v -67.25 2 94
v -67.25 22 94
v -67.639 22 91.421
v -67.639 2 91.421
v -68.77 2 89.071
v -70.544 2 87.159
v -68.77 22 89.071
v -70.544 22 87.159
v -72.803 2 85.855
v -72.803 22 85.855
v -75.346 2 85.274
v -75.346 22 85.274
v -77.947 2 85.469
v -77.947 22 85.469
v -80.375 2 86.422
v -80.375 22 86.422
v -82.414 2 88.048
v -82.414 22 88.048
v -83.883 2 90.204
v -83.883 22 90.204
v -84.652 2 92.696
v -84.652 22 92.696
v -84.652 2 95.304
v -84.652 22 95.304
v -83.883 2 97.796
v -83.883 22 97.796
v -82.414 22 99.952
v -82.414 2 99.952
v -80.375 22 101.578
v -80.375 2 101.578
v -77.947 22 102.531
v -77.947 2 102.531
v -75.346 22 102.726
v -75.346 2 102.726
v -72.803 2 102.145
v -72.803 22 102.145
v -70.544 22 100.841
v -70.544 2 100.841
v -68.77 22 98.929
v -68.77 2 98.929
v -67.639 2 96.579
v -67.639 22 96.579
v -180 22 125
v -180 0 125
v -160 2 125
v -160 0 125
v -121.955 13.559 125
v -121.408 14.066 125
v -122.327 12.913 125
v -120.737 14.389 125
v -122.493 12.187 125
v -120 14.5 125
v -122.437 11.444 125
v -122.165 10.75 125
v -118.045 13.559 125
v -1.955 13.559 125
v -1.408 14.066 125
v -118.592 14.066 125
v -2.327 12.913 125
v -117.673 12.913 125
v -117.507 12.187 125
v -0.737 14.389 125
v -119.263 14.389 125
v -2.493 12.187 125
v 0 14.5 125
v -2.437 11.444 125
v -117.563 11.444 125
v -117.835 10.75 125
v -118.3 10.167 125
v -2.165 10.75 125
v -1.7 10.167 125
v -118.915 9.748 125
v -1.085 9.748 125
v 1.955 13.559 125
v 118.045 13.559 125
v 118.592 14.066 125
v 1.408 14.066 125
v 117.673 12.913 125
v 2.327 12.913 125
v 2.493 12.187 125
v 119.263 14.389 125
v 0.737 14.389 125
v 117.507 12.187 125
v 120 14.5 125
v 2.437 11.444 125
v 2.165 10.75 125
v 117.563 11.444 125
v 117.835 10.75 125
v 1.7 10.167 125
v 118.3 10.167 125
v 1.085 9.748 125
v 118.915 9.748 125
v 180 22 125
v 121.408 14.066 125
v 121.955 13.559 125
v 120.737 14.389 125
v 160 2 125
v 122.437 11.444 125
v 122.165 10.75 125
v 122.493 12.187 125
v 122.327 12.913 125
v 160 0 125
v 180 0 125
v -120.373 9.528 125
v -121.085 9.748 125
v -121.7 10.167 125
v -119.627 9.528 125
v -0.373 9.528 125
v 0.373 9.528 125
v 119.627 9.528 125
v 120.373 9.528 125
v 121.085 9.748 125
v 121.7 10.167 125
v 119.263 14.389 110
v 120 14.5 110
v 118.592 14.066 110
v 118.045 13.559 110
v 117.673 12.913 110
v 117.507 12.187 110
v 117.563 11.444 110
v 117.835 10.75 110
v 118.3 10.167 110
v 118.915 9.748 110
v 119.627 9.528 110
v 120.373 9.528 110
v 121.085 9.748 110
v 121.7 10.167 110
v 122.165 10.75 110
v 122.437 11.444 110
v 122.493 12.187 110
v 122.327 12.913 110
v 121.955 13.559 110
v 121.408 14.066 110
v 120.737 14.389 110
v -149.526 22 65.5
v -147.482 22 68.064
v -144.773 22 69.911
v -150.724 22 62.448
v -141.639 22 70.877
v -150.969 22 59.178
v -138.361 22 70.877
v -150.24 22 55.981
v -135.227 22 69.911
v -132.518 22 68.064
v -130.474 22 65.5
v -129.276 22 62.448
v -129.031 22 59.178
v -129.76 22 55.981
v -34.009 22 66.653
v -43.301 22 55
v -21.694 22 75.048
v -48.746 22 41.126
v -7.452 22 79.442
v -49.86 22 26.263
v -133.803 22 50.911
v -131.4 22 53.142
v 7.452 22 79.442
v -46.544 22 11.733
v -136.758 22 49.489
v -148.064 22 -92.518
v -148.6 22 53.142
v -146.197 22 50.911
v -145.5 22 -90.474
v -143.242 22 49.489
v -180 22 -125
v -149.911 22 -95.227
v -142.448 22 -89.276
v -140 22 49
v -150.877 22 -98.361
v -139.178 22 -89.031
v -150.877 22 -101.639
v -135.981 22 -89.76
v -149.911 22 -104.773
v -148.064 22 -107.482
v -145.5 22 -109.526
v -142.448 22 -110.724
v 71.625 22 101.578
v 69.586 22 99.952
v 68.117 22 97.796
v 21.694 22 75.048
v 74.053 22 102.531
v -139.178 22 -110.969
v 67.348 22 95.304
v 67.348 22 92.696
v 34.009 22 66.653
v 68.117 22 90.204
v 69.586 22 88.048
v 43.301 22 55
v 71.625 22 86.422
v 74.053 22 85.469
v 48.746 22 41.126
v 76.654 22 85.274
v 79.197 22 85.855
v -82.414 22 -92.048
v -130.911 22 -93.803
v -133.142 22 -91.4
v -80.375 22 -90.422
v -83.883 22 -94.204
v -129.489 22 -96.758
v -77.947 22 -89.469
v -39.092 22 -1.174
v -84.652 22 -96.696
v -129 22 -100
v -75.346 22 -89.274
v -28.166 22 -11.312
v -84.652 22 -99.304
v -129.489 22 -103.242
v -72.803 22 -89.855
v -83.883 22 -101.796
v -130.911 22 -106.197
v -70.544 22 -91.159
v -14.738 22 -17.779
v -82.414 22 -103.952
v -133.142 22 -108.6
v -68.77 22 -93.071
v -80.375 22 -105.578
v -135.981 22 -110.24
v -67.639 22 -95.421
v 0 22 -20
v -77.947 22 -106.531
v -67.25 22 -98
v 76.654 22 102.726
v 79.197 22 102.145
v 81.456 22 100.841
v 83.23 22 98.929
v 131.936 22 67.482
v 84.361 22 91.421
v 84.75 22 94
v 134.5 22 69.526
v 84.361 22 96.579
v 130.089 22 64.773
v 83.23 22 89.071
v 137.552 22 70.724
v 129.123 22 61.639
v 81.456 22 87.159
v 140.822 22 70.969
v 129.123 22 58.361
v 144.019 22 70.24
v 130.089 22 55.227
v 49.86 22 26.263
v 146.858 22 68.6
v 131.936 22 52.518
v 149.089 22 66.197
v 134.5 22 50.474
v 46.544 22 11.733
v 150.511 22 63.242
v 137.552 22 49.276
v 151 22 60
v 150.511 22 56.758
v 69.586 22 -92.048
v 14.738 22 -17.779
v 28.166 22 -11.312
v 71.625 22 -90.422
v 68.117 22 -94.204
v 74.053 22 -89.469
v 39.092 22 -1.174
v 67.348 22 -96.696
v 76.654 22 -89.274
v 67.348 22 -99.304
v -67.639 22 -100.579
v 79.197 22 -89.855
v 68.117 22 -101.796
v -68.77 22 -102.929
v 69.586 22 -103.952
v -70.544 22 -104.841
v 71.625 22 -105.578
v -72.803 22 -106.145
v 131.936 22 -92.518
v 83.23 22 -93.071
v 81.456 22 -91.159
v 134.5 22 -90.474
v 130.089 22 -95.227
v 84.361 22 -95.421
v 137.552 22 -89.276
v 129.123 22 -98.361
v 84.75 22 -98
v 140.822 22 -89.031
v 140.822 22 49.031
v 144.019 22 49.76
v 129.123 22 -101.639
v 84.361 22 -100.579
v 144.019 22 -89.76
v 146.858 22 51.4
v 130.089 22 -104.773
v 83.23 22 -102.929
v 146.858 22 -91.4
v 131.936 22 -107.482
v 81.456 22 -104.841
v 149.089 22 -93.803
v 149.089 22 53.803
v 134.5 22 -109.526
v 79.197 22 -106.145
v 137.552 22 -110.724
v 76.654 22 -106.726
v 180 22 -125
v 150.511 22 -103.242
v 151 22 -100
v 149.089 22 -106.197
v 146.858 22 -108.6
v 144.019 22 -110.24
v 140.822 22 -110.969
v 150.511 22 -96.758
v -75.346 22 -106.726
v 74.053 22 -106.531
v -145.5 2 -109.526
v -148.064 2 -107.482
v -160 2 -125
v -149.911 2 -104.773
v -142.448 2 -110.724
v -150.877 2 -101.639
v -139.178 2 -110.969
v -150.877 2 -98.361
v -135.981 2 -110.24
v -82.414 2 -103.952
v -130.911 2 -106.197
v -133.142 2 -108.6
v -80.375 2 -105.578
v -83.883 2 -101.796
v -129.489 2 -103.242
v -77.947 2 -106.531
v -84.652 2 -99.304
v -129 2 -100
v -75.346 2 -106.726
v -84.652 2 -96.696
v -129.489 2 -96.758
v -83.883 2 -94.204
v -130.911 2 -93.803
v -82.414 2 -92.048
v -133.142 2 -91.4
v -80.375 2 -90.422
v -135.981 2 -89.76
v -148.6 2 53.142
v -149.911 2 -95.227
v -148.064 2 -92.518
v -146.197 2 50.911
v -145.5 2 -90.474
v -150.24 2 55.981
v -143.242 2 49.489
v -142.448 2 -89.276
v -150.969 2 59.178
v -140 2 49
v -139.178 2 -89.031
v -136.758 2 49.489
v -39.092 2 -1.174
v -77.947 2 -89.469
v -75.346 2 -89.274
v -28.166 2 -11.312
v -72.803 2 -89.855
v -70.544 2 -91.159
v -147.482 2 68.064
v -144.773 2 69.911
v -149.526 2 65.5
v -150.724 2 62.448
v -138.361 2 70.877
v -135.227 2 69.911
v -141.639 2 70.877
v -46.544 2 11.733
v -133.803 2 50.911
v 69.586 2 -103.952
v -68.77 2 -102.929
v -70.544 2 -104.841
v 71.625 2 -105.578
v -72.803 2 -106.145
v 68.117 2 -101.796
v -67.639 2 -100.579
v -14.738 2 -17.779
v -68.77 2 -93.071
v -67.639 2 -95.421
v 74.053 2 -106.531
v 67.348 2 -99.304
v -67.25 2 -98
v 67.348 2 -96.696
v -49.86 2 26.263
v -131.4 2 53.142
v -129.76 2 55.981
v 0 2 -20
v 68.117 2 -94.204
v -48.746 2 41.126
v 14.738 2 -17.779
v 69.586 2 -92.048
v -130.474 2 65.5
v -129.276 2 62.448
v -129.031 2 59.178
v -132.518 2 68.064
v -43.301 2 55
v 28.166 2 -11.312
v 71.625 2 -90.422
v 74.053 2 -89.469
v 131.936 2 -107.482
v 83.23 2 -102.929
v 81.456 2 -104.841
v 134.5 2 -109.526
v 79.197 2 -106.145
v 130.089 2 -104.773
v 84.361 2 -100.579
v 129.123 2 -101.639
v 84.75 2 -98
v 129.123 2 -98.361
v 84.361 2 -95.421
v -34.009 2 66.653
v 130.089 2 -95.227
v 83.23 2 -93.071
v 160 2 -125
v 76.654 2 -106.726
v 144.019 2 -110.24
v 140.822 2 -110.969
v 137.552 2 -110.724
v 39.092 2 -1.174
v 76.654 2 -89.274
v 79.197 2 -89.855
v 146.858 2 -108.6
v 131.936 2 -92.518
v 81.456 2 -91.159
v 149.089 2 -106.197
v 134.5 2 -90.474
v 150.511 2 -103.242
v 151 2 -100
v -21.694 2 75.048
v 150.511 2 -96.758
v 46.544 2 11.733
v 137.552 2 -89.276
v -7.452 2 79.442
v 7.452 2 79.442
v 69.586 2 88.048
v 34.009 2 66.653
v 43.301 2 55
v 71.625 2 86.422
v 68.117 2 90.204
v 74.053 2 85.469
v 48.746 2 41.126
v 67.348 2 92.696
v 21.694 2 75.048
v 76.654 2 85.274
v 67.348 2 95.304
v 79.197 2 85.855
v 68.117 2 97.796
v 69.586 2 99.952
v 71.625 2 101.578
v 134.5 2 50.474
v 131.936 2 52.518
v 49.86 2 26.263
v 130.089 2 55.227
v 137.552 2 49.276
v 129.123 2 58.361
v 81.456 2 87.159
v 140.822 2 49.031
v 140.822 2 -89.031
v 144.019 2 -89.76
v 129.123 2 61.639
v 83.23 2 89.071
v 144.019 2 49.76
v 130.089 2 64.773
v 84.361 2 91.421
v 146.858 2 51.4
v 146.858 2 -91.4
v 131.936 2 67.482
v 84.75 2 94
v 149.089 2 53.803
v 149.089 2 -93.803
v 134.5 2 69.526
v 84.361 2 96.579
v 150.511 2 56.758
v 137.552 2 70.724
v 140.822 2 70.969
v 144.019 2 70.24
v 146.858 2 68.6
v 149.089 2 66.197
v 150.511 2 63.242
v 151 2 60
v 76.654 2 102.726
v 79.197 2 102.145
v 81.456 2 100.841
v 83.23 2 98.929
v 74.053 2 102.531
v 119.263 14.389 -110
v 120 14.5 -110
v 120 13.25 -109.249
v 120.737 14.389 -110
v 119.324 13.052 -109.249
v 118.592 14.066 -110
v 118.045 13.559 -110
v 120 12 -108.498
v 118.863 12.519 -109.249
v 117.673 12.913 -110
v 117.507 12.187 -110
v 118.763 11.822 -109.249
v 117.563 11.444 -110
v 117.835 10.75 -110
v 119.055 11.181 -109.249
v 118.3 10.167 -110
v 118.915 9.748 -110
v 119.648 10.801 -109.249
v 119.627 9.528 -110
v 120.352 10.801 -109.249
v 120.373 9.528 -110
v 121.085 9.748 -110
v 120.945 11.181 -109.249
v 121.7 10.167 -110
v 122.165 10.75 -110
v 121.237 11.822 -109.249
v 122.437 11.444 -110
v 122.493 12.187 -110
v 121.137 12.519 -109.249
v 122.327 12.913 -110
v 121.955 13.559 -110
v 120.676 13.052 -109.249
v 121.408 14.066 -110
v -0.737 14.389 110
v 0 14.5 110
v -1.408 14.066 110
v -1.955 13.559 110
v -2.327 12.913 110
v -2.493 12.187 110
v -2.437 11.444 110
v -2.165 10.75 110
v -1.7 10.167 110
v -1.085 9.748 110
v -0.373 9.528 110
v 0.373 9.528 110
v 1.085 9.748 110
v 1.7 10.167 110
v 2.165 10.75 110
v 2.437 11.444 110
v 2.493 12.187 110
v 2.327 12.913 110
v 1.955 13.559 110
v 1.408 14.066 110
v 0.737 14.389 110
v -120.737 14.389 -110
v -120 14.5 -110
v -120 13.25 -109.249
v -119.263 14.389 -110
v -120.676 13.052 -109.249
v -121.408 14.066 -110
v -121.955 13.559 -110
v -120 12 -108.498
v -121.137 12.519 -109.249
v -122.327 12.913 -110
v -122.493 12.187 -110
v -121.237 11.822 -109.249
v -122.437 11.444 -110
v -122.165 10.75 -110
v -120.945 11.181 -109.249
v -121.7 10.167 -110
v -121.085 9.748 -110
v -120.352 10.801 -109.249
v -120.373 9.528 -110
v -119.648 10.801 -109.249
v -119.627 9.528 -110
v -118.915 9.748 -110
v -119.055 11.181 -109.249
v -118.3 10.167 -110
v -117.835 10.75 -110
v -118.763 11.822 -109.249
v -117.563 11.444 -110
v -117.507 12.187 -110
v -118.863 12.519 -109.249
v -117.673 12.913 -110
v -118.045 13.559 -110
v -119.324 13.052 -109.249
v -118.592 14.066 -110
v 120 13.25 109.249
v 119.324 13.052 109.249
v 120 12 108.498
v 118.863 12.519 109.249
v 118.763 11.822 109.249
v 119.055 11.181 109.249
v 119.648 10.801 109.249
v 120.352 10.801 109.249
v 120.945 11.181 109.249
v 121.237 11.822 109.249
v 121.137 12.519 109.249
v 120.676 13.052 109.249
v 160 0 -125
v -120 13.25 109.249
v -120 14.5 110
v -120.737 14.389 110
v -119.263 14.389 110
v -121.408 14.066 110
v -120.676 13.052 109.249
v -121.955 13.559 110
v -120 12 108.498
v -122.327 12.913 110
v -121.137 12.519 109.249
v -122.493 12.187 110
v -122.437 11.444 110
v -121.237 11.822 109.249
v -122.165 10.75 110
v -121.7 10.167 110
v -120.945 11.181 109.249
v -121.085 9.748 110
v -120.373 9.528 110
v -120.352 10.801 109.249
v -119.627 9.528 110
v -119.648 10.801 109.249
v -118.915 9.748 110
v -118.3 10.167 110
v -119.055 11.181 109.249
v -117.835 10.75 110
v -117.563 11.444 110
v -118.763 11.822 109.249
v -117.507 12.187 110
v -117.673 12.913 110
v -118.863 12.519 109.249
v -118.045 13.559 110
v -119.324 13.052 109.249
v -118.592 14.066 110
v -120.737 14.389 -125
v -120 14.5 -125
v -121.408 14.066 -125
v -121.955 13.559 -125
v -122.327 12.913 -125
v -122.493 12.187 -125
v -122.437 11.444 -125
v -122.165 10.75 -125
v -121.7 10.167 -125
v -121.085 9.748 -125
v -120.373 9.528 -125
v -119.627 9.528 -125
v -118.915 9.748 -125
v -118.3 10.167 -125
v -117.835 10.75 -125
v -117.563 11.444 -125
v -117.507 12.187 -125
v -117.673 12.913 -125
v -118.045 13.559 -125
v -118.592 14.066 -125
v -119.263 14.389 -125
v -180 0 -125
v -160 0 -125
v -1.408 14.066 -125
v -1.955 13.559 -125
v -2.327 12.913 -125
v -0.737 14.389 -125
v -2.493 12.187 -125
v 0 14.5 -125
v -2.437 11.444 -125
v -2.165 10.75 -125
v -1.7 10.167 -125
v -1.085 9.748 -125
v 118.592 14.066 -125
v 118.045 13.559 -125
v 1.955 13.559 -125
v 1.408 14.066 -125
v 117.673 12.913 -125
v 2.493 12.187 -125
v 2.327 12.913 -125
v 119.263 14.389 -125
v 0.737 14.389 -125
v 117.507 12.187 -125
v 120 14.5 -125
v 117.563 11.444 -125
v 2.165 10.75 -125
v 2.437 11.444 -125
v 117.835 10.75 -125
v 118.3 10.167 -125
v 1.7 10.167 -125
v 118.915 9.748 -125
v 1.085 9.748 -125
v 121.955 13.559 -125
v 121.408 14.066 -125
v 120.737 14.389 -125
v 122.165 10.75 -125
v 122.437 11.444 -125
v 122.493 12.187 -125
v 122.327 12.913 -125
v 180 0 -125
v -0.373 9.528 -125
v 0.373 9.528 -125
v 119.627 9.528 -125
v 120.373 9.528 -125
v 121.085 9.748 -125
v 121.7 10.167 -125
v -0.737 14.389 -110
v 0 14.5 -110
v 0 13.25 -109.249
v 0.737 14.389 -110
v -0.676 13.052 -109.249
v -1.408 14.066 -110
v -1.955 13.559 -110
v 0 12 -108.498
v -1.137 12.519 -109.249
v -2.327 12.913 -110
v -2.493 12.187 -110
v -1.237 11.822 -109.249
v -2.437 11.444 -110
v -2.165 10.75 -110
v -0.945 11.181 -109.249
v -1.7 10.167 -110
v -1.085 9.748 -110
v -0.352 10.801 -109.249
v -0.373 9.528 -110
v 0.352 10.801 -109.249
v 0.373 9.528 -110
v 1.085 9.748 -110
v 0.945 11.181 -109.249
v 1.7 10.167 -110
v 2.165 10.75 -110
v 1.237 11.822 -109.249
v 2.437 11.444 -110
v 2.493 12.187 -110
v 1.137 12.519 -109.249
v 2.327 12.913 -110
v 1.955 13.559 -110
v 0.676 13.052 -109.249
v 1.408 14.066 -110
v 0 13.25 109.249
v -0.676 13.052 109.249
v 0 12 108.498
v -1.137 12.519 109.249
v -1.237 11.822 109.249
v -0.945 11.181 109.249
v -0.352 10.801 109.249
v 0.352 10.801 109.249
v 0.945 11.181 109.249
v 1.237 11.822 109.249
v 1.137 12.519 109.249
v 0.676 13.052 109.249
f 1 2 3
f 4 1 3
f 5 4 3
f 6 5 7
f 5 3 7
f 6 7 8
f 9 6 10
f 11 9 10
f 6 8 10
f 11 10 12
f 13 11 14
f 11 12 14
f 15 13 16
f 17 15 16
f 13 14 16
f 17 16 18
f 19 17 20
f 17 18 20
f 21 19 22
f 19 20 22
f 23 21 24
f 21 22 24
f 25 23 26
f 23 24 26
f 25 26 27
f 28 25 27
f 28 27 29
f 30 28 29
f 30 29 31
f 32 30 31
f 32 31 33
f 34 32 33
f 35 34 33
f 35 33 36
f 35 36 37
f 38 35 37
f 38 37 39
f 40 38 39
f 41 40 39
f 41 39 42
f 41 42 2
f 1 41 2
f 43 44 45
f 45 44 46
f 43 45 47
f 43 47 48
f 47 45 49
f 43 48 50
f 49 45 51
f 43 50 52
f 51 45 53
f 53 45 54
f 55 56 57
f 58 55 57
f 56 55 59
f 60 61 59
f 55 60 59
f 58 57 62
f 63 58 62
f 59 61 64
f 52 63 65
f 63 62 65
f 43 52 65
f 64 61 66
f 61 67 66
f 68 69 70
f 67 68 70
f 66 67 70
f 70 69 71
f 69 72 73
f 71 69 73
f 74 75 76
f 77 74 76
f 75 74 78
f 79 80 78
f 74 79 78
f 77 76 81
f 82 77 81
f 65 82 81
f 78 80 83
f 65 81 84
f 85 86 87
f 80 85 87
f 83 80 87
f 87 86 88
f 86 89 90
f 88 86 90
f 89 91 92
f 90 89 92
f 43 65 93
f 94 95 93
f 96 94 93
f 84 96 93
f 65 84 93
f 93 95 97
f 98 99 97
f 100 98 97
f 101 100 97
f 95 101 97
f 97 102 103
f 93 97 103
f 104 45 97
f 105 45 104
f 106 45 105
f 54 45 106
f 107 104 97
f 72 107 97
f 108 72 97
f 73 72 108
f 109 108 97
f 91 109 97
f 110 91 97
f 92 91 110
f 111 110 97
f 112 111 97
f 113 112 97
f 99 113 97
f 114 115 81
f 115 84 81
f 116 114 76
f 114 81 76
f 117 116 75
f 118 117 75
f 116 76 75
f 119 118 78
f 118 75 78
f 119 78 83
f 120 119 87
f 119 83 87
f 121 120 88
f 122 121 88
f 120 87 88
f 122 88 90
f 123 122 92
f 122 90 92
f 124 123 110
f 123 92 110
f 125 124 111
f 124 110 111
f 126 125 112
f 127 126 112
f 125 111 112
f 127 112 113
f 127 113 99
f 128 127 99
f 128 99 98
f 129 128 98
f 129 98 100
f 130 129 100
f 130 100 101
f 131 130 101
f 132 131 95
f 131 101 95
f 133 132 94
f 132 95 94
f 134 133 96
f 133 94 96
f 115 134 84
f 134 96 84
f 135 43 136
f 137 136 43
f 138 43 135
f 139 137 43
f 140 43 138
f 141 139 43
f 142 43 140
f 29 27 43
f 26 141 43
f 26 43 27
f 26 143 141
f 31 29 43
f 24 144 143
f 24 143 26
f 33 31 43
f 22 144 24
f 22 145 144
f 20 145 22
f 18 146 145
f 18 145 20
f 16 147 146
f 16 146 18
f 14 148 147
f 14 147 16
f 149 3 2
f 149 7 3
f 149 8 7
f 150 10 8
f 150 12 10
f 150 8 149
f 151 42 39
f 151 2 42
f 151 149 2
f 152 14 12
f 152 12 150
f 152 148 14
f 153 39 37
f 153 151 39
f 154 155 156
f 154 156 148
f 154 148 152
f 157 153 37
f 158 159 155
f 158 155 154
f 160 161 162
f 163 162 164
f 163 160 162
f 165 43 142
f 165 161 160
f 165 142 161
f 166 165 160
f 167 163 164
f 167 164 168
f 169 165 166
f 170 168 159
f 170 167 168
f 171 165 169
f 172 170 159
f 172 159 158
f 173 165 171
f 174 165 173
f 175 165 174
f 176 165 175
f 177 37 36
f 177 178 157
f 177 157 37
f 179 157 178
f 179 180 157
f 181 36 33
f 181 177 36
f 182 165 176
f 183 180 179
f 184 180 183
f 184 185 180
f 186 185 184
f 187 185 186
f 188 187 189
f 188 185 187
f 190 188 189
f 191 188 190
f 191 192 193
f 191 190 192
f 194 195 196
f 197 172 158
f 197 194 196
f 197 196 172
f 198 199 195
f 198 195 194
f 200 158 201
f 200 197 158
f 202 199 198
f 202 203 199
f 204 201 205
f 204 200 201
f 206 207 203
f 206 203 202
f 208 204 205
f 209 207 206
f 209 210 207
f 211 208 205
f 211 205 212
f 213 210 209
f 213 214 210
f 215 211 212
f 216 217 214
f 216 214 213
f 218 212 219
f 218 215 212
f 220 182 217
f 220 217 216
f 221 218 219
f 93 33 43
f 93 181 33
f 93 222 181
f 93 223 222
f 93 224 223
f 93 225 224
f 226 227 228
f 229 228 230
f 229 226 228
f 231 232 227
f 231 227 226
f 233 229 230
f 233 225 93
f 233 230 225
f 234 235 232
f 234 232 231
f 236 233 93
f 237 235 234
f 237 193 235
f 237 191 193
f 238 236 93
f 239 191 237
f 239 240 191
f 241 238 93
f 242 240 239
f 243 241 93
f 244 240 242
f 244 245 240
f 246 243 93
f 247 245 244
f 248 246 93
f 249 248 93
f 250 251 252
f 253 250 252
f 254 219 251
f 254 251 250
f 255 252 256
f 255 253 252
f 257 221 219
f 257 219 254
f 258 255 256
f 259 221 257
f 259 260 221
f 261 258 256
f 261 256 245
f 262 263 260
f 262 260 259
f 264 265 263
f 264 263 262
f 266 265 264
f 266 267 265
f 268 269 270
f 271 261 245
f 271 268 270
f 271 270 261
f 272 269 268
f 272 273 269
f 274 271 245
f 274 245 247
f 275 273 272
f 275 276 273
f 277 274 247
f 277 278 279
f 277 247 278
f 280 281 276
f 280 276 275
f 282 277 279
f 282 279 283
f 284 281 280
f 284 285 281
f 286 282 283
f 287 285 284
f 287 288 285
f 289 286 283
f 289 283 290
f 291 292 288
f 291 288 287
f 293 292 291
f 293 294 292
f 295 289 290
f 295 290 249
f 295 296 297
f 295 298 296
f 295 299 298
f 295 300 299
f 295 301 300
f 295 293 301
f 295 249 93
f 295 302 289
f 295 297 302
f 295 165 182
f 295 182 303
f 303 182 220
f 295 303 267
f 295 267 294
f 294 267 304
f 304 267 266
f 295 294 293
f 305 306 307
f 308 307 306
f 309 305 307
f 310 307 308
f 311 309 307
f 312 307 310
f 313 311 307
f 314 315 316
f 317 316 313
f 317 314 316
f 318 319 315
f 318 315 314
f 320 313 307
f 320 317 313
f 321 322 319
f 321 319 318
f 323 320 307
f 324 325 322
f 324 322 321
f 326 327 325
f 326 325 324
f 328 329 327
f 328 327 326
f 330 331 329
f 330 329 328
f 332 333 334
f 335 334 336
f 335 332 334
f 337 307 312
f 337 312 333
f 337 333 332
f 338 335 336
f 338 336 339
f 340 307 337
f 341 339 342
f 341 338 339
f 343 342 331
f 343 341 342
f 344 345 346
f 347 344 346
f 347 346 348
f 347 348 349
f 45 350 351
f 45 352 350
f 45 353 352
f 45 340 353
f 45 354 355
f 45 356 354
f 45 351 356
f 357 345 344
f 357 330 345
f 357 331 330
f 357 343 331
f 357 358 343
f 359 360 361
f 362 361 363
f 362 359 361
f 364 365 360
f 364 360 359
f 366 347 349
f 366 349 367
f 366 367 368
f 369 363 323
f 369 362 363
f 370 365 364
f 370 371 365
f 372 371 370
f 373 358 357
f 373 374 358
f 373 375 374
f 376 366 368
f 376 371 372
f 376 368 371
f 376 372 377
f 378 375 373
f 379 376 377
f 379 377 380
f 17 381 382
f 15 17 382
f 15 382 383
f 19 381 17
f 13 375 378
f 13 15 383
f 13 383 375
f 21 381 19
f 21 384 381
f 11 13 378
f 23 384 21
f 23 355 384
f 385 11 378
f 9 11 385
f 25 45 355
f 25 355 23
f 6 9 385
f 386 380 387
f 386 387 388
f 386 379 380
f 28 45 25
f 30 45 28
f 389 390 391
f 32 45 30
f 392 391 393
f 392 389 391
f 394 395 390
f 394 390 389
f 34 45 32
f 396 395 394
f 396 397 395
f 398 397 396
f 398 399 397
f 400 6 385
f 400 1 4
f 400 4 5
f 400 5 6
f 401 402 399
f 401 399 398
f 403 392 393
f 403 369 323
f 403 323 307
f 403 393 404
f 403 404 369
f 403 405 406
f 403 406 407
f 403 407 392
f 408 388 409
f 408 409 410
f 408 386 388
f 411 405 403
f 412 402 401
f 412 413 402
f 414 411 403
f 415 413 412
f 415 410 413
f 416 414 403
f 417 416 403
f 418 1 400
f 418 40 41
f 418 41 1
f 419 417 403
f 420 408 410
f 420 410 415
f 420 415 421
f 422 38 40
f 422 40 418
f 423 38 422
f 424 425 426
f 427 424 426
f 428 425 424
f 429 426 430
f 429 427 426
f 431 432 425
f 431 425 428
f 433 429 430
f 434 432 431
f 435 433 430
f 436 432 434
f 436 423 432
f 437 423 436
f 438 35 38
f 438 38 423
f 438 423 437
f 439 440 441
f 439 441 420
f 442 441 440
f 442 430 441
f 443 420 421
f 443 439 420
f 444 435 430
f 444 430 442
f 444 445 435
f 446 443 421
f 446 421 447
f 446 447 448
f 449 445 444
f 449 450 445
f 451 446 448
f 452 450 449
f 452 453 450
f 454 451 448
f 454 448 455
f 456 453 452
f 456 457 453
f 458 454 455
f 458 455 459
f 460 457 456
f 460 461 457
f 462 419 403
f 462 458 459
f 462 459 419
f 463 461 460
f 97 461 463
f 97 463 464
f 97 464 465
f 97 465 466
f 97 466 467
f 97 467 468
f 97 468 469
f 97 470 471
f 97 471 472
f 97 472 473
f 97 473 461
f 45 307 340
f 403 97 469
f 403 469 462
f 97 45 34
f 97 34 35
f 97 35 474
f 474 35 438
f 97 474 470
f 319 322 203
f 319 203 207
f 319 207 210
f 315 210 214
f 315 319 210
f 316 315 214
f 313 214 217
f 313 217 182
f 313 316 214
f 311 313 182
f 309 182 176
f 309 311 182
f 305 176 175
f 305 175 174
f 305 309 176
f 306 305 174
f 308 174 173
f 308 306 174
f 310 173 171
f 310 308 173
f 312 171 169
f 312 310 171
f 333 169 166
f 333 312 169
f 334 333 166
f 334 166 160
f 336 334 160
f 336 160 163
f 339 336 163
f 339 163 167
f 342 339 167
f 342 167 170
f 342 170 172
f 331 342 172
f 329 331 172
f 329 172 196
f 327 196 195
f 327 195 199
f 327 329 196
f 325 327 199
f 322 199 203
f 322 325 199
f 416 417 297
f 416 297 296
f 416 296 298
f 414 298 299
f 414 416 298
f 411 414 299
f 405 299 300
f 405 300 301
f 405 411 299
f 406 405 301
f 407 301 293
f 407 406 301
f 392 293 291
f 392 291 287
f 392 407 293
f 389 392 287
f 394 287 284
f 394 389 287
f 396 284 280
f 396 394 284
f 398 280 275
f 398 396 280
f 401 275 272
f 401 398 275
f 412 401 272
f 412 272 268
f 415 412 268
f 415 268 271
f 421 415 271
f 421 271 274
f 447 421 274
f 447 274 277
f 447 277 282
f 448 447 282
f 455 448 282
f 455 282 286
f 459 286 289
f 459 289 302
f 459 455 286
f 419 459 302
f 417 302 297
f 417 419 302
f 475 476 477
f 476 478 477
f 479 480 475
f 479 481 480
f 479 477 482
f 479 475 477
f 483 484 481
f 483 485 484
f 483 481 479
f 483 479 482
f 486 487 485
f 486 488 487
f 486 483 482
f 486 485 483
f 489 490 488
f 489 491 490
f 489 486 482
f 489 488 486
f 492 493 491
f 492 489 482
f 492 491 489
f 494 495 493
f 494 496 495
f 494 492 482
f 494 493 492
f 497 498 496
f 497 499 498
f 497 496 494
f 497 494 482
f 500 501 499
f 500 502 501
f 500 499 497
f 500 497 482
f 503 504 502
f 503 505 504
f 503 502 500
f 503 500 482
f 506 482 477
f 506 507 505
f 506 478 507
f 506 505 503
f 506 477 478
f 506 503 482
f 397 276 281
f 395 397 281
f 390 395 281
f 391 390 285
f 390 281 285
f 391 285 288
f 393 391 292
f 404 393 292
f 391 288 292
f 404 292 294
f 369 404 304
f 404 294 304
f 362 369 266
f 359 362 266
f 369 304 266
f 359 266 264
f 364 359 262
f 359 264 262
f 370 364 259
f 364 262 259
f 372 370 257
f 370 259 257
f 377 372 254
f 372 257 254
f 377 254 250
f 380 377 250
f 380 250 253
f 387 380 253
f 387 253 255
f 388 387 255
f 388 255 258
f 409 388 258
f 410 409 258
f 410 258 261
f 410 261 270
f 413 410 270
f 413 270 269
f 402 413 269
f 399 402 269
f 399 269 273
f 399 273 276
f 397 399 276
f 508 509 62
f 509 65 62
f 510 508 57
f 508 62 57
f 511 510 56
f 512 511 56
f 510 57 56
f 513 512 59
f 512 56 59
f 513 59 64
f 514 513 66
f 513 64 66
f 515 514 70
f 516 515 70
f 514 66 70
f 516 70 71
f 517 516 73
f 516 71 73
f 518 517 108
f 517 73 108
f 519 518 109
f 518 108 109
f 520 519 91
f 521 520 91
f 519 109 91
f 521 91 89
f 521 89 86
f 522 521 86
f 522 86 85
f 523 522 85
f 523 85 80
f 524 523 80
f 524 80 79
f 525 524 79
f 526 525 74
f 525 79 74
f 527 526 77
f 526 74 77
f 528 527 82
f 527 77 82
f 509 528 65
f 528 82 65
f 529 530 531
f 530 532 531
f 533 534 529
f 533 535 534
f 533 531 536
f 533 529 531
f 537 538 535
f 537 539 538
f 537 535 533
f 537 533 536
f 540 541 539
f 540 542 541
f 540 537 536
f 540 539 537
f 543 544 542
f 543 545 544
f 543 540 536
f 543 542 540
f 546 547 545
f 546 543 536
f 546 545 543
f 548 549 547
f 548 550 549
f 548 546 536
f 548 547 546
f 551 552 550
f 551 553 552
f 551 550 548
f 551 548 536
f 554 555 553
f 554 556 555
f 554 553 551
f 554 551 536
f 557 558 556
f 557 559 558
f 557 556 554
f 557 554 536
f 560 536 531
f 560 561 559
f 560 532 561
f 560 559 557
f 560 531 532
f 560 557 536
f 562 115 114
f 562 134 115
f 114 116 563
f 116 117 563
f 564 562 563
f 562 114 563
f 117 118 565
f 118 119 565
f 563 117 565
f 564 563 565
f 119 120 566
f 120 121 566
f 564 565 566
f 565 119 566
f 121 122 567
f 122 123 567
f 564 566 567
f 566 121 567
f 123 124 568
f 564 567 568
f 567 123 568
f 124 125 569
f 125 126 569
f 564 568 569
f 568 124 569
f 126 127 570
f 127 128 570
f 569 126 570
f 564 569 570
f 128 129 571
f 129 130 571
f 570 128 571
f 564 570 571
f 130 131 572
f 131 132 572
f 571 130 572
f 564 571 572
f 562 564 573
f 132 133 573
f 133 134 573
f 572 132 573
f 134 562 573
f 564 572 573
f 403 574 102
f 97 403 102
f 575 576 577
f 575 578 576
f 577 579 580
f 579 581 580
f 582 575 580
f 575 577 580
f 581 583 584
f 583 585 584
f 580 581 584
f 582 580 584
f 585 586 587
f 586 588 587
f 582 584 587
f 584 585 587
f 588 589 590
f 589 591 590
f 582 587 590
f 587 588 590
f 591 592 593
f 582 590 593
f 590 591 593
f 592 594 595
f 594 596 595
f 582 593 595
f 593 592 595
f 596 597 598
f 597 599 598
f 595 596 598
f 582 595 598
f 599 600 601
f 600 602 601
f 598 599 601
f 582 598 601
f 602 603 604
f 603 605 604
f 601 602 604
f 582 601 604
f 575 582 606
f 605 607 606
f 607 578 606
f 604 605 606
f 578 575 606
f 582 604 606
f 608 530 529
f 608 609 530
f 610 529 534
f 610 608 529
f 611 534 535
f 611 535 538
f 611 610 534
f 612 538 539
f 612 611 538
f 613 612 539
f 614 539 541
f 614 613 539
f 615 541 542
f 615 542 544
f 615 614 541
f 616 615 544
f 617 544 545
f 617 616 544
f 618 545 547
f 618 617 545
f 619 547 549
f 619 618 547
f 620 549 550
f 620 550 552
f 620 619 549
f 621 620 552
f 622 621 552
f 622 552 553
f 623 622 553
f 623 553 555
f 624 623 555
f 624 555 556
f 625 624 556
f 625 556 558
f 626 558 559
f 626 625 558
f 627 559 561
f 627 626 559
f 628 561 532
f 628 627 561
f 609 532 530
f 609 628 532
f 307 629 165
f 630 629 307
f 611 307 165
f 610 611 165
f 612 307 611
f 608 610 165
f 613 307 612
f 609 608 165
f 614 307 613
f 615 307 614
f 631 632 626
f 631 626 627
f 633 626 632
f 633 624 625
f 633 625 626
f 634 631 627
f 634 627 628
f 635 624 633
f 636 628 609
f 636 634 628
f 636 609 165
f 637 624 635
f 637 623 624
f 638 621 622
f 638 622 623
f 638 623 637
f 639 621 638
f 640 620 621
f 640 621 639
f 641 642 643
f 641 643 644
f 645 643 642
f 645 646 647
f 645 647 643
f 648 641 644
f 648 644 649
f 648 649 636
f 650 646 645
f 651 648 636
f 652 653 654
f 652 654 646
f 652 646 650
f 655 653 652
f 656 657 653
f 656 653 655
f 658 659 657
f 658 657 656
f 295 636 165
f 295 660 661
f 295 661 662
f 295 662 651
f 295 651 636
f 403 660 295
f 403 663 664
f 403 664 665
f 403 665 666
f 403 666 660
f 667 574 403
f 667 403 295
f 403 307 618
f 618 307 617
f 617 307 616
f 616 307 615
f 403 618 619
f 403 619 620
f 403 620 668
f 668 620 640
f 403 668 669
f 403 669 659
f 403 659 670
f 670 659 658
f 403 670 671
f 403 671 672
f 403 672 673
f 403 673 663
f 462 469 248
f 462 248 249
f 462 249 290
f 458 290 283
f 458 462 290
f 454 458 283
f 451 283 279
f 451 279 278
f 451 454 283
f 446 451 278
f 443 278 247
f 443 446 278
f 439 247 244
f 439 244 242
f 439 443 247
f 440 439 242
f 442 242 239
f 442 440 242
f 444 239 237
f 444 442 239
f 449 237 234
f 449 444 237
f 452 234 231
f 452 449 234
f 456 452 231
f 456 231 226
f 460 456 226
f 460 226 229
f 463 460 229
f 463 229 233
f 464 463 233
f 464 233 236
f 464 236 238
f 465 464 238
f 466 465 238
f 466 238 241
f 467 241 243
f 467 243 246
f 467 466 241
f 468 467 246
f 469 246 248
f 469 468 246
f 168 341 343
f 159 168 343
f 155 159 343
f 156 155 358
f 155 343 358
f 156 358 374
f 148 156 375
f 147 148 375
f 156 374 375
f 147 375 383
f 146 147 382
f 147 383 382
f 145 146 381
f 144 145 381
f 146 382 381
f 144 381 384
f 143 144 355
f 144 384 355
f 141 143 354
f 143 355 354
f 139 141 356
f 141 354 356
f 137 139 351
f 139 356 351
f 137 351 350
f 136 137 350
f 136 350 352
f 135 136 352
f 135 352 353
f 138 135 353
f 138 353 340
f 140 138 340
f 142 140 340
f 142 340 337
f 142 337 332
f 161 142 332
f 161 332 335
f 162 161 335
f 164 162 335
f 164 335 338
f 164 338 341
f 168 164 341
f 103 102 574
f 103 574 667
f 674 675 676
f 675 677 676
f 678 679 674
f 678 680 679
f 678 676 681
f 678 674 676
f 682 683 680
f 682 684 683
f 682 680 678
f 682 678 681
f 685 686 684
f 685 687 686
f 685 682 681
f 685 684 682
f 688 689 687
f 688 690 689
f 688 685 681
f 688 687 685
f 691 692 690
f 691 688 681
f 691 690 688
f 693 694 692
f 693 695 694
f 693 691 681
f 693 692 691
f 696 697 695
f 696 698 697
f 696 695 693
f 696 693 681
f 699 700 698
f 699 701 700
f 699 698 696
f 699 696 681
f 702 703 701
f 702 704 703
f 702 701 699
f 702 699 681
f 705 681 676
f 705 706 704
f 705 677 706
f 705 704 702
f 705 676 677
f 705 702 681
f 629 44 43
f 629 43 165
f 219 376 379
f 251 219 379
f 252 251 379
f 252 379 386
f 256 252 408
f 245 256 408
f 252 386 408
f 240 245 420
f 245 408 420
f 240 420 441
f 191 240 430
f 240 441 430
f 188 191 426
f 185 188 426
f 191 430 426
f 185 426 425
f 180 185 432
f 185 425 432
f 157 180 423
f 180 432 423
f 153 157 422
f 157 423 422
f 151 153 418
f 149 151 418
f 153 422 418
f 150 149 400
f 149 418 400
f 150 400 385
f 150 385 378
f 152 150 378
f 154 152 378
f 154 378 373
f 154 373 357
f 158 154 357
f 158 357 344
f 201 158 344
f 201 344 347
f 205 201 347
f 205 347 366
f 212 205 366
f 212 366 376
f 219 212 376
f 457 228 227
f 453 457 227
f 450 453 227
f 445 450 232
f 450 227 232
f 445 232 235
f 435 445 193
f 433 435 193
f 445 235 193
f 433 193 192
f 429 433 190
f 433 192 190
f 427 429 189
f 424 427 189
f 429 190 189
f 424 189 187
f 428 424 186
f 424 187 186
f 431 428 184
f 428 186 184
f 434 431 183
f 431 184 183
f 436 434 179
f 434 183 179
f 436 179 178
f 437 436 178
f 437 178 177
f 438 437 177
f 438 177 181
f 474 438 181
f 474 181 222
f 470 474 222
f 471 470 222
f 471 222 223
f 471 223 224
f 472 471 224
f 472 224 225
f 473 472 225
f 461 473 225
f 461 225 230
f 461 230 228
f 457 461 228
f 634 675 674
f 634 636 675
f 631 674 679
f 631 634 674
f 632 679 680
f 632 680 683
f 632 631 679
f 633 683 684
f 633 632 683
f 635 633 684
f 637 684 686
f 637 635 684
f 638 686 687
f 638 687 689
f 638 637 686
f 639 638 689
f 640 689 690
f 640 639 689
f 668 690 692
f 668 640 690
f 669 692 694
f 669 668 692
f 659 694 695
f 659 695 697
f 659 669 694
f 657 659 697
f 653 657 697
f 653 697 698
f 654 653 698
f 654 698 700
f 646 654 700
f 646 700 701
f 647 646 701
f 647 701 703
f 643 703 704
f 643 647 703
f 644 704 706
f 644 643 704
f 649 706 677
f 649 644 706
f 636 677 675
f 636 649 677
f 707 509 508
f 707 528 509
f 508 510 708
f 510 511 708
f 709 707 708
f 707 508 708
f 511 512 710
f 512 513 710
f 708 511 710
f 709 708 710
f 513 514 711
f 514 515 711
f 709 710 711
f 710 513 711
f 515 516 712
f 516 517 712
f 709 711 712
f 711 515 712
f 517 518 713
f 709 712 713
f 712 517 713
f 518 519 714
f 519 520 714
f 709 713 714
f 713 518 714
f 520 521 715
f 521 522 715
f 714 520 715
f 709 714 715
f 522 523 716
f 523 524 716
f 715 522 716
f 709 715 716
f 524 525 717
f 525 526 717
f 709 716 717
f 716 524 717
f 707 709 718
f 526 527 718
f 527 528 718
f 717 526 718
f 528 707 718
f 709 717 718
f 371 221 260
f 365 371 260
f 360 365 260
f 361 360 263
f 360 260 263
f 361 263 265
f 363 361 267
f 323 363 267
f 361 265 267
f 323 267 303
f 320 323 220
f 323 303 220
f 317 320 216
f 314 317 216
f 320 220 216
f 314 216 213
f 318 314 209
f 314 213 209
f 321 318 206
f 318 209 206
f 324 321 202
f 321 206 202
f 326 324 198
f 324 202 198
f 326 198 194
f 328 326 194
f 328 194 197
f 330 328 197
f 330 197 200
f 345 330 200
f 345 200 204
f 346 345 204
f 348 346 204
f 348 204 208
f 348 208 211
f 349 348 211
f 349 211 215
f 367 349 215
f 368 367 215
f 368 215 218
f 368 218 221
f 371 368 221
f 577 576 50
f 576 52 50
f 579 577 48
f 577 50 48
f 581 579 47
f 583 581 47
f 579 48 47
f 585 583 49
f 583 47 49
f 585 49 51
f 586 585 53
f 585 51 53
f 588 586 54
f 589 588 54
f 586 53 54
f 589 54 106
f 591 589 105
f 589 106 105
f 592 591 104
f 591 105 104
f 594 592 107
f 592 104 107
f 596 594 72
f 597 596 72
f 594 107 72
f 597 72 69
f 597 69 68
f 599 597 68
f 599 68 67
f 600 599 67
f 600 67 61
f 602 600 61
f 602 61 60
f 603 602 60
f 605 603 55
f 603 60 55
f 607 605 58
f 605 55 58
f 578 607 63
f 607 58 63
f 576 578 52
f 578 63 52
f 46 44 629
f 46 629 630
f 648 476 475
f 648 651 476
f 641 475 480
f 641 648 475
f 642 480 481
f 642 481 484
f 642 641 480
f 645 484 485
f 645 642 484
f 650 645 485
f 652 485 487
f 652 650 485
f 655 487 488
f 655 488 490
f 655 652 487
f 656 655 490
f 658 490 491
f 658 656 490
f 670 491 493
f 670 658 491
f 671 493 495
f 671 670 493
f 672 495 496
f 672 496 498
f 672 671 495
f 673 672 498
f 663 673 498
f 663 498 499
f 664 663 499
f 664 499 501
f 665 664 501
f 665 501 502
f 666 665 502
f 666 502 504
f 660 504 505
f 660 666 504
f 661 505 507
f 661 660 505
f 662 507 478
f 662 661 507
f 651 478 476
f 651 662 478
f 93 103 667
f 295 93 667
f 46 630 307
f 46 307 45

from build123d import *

# Parameters (mm, degrees)
SKETCH_1_W                  = 360
SKETCH_1_H                  = 250
EXTRUDE_1_DEPTH             = 22
CUT_EXTRUDE_1_REACH         = 222.248
SKETCH_2_R                  = 50
SKETCH_2_R_2                = 11
SKETCH_3_W                  = 320
SKETCH_3_H                  = 250
CUT_EXTRUDE_2_DEPTH         = 2
PATTERN_START               = 2
PATTERN_LINEAR_1_OUTLINE_R  = 11
PATTERN_LINEAR_1_DEPTH      = 20
HOLE_WIZARD_M20_1_D         = 17.5
PATTERN_LINEAR_2_COUNT      = 2
PATTERN_LINEAR_2_PITCH      = 192
PATTERN_LINEAR_2_COUNT_DIR2 = 2
PATTERN_LINEAR_2_PITCH_DIR2 = 152
HOLE_WIZARD_M6_1_AT_2_COUNT = 2
HOLE_WIZARD_M6_1_AT_2_PITCH = 120
HOLE_WIZARD_M6_1_AT_3_COUNT = 2
HOLE_WIZARD_M6_1_AT_3_PITCH = 240


# Read off the part's stored shape, not the designer's step: 阵列(线性)1
with BuildPart() as part:
    # 草图1 → 凸台-拉伸1 (new body)
    with BuildSketch(Plane(origin=(0, 0, 0), x_dir=(1, 0, 0), z_dir=(0, 1, 0))):
        Rectangle(SKETCH_1_W, SKETCH_1_H)
    extrude(amount=EXTRUDE_1_DEPTH)

    # 草图2 → 切除-拉伸1 (cut, up to next)
    with BuildSketch(Plane.XZ, mode=Mode.PRIVATE) as cut_extrude_1_sk1:
        with Locations(Location((0, 30, 0), (0, 0, 270))):
            Circle(SKETCH_2_R)
    cut_extrude_1_tool1 = extrude(cut_extrude_1_sk1.sketch, amount=-CUT_EXTRUDE_1_REACH, mode=Mode.PRIVATE) & part.part
    # 草图2 → 切除-拉伸1 (cut, up to next)
    with BuildSketch(Plane.XZ, mode=Mode.PRIVATE) as cut_extrude_1_sk2:
        with Locations(Location((-140, 60, 0), (0, 0, 270))):
            Circle(SKETCH_2_R_2)
    cut_extrude_1_tool2 = extrude(cut_extrude_1_sk2.sketch, amount=-CUT_EXTRUDE_1_REACH, mode=Mode.PRIVATE) & part.part
    add(cut_extrude_1_tool1.solids().sort_by_distance((0, 0, 30))[0], mode=Mode.SUBTRACT)
    add(cut_extrude_1_tool2.solids().sort_by_distance((-140, 0, 60))[0], mode=Mode.SUBTRACT)

    # 草图3 → 切除-拉伸2 (cut)
    with BuildSketch(Plane.XZ):
        Rectangle(SKETCH_3_W, SKETCH_3_H)
    extrude(amount=-CUT_EXTRUDE_2_DEPTH, mode=Mode.SUBTRACT)

    # 阵列(线性)1 outline → 阵列(线性)1 (cut)
    with BuildSketch(Plane(origin=(0, 0, 0), x_dir=(1, 0, 0), z_dir=(0, 1, 0)).offset(PATTERN_START)):
        with Locations((140, 100)):
            Circle(PATTERN_LINEAR_1_OUTLINE_R)
        with Locations((-140, 100)):
            Circle(PATTERN_LINEAR_1_OUTLINE_R)
        with Locations((140, -60)):
            Circle(PATTERN_LINEAR_1_OUTLINE_R)
    extrude(amount=PATTERN_LINEAR_1_DEPTH, mode=Mode.SUBTRACT)

    # M20 螺纹孔1 (through all)
    with Locations(Plane(origin=(0, 2, 0), x_dir=(-1, 0, 0), z_dir=(0, -1, 0))):
        with Locations((76, -94)):
            hole_wizard_m20_1 = Hole(HOLE_WIZARD_M20_1_D / 2)

    # 阵列(线性)2: Hole Wizard M20 _1 2 × 2
    with Locations(*[(j * PATTERN_LINEAR_2_PITCH_DIR2, 0, -i * PATTERN_LINEAR_2_PITCH) for i in range(PATTERN_LINEAR_2_COUNT) for j in range(PATTERN_LINEAR_2_COUNT_DIR2) if (i, j) != (0, 0)]):
        add(hole_wizard_m20_1, mode=Mode.SUBTRACT)

    # 草图7 → M6 螺纹孔1 (revolve, cut)
    with BuildSketch(Plane(origin=(120, 12, -125), x_dir=(0, 1, 0), z_dir=(1, 0, 0))):
        Polygon((0, 0), (0, 16.502151548), (2.5, 15), (2.5, 0), align=None)
    hole_wizard_m6_1 = revolve(axis=Axis((120, 12, -131.35), (0, 0, 1)), mode=Mode.SUBTRACT)

    # M6 螺纹孔1 at 2: M6 螺纹孔1 ×2
    with Locations(*[(-i * HOLE_WIZARD_M6_1_AT_2_PITCH, 0, 0) for i in range(1, HOLE_WIZARD_M6_1_AT_2_COUNT)]):
        add(hole_wizard_m6_1, mode=Mode.SUBTRACT)

    # M6 螺纹孔1 at 3: M6 螺纹孔1 ×2
    with Locations(*[(-i * HOLE_WIZARD_M6_1_AT_3_PITCH, 0, 0) for i in range(1, HOLE_WIZARD_M6_1_AT_3_COUNT)]):
        add(hole_wizard_m6_1, mode=Mode.SUBTRACT)

    # 镜向1: M6 螺纹孔1 across plane
    add(hole_wizard_m6_1.mirror(Plane.XY), mode=Mode.SUBTRACT)

    # 镜向1 copy 1 sketch → 镜向1 copy 1 (revolve, cut)
    with BuildSketch(Plane(origin=(0, 12, 125), x_dir=(0, 1, 0), z_dir=(1, 0, 0))):
        Polygon((0, 0), (0, -16.502151548), (2.5, -15), (2.5, 0), align=None)
    revolve(axis=Axis((0, 12, 131.35), (0, 0, 1)), mode=Mode.SUBTRACT)

    # 镜向1 copy 2 sketch → 镜向1 copy 2 (revolve, cut)
    with BuildSketch(Plane(origin=(-120, 12, 125), x_dir=(0, 1, 0), z_dir=(1, 0, 0))):
        Polygon((0, 0), (0, -16.502151548), (2.5, -15), (2.5, 0), align=None)
    revolve(axis=Axis((-120, 12, 131.35), (0, 0, 1)), mode=Mode.SUBTRACT)


solid = part.part
